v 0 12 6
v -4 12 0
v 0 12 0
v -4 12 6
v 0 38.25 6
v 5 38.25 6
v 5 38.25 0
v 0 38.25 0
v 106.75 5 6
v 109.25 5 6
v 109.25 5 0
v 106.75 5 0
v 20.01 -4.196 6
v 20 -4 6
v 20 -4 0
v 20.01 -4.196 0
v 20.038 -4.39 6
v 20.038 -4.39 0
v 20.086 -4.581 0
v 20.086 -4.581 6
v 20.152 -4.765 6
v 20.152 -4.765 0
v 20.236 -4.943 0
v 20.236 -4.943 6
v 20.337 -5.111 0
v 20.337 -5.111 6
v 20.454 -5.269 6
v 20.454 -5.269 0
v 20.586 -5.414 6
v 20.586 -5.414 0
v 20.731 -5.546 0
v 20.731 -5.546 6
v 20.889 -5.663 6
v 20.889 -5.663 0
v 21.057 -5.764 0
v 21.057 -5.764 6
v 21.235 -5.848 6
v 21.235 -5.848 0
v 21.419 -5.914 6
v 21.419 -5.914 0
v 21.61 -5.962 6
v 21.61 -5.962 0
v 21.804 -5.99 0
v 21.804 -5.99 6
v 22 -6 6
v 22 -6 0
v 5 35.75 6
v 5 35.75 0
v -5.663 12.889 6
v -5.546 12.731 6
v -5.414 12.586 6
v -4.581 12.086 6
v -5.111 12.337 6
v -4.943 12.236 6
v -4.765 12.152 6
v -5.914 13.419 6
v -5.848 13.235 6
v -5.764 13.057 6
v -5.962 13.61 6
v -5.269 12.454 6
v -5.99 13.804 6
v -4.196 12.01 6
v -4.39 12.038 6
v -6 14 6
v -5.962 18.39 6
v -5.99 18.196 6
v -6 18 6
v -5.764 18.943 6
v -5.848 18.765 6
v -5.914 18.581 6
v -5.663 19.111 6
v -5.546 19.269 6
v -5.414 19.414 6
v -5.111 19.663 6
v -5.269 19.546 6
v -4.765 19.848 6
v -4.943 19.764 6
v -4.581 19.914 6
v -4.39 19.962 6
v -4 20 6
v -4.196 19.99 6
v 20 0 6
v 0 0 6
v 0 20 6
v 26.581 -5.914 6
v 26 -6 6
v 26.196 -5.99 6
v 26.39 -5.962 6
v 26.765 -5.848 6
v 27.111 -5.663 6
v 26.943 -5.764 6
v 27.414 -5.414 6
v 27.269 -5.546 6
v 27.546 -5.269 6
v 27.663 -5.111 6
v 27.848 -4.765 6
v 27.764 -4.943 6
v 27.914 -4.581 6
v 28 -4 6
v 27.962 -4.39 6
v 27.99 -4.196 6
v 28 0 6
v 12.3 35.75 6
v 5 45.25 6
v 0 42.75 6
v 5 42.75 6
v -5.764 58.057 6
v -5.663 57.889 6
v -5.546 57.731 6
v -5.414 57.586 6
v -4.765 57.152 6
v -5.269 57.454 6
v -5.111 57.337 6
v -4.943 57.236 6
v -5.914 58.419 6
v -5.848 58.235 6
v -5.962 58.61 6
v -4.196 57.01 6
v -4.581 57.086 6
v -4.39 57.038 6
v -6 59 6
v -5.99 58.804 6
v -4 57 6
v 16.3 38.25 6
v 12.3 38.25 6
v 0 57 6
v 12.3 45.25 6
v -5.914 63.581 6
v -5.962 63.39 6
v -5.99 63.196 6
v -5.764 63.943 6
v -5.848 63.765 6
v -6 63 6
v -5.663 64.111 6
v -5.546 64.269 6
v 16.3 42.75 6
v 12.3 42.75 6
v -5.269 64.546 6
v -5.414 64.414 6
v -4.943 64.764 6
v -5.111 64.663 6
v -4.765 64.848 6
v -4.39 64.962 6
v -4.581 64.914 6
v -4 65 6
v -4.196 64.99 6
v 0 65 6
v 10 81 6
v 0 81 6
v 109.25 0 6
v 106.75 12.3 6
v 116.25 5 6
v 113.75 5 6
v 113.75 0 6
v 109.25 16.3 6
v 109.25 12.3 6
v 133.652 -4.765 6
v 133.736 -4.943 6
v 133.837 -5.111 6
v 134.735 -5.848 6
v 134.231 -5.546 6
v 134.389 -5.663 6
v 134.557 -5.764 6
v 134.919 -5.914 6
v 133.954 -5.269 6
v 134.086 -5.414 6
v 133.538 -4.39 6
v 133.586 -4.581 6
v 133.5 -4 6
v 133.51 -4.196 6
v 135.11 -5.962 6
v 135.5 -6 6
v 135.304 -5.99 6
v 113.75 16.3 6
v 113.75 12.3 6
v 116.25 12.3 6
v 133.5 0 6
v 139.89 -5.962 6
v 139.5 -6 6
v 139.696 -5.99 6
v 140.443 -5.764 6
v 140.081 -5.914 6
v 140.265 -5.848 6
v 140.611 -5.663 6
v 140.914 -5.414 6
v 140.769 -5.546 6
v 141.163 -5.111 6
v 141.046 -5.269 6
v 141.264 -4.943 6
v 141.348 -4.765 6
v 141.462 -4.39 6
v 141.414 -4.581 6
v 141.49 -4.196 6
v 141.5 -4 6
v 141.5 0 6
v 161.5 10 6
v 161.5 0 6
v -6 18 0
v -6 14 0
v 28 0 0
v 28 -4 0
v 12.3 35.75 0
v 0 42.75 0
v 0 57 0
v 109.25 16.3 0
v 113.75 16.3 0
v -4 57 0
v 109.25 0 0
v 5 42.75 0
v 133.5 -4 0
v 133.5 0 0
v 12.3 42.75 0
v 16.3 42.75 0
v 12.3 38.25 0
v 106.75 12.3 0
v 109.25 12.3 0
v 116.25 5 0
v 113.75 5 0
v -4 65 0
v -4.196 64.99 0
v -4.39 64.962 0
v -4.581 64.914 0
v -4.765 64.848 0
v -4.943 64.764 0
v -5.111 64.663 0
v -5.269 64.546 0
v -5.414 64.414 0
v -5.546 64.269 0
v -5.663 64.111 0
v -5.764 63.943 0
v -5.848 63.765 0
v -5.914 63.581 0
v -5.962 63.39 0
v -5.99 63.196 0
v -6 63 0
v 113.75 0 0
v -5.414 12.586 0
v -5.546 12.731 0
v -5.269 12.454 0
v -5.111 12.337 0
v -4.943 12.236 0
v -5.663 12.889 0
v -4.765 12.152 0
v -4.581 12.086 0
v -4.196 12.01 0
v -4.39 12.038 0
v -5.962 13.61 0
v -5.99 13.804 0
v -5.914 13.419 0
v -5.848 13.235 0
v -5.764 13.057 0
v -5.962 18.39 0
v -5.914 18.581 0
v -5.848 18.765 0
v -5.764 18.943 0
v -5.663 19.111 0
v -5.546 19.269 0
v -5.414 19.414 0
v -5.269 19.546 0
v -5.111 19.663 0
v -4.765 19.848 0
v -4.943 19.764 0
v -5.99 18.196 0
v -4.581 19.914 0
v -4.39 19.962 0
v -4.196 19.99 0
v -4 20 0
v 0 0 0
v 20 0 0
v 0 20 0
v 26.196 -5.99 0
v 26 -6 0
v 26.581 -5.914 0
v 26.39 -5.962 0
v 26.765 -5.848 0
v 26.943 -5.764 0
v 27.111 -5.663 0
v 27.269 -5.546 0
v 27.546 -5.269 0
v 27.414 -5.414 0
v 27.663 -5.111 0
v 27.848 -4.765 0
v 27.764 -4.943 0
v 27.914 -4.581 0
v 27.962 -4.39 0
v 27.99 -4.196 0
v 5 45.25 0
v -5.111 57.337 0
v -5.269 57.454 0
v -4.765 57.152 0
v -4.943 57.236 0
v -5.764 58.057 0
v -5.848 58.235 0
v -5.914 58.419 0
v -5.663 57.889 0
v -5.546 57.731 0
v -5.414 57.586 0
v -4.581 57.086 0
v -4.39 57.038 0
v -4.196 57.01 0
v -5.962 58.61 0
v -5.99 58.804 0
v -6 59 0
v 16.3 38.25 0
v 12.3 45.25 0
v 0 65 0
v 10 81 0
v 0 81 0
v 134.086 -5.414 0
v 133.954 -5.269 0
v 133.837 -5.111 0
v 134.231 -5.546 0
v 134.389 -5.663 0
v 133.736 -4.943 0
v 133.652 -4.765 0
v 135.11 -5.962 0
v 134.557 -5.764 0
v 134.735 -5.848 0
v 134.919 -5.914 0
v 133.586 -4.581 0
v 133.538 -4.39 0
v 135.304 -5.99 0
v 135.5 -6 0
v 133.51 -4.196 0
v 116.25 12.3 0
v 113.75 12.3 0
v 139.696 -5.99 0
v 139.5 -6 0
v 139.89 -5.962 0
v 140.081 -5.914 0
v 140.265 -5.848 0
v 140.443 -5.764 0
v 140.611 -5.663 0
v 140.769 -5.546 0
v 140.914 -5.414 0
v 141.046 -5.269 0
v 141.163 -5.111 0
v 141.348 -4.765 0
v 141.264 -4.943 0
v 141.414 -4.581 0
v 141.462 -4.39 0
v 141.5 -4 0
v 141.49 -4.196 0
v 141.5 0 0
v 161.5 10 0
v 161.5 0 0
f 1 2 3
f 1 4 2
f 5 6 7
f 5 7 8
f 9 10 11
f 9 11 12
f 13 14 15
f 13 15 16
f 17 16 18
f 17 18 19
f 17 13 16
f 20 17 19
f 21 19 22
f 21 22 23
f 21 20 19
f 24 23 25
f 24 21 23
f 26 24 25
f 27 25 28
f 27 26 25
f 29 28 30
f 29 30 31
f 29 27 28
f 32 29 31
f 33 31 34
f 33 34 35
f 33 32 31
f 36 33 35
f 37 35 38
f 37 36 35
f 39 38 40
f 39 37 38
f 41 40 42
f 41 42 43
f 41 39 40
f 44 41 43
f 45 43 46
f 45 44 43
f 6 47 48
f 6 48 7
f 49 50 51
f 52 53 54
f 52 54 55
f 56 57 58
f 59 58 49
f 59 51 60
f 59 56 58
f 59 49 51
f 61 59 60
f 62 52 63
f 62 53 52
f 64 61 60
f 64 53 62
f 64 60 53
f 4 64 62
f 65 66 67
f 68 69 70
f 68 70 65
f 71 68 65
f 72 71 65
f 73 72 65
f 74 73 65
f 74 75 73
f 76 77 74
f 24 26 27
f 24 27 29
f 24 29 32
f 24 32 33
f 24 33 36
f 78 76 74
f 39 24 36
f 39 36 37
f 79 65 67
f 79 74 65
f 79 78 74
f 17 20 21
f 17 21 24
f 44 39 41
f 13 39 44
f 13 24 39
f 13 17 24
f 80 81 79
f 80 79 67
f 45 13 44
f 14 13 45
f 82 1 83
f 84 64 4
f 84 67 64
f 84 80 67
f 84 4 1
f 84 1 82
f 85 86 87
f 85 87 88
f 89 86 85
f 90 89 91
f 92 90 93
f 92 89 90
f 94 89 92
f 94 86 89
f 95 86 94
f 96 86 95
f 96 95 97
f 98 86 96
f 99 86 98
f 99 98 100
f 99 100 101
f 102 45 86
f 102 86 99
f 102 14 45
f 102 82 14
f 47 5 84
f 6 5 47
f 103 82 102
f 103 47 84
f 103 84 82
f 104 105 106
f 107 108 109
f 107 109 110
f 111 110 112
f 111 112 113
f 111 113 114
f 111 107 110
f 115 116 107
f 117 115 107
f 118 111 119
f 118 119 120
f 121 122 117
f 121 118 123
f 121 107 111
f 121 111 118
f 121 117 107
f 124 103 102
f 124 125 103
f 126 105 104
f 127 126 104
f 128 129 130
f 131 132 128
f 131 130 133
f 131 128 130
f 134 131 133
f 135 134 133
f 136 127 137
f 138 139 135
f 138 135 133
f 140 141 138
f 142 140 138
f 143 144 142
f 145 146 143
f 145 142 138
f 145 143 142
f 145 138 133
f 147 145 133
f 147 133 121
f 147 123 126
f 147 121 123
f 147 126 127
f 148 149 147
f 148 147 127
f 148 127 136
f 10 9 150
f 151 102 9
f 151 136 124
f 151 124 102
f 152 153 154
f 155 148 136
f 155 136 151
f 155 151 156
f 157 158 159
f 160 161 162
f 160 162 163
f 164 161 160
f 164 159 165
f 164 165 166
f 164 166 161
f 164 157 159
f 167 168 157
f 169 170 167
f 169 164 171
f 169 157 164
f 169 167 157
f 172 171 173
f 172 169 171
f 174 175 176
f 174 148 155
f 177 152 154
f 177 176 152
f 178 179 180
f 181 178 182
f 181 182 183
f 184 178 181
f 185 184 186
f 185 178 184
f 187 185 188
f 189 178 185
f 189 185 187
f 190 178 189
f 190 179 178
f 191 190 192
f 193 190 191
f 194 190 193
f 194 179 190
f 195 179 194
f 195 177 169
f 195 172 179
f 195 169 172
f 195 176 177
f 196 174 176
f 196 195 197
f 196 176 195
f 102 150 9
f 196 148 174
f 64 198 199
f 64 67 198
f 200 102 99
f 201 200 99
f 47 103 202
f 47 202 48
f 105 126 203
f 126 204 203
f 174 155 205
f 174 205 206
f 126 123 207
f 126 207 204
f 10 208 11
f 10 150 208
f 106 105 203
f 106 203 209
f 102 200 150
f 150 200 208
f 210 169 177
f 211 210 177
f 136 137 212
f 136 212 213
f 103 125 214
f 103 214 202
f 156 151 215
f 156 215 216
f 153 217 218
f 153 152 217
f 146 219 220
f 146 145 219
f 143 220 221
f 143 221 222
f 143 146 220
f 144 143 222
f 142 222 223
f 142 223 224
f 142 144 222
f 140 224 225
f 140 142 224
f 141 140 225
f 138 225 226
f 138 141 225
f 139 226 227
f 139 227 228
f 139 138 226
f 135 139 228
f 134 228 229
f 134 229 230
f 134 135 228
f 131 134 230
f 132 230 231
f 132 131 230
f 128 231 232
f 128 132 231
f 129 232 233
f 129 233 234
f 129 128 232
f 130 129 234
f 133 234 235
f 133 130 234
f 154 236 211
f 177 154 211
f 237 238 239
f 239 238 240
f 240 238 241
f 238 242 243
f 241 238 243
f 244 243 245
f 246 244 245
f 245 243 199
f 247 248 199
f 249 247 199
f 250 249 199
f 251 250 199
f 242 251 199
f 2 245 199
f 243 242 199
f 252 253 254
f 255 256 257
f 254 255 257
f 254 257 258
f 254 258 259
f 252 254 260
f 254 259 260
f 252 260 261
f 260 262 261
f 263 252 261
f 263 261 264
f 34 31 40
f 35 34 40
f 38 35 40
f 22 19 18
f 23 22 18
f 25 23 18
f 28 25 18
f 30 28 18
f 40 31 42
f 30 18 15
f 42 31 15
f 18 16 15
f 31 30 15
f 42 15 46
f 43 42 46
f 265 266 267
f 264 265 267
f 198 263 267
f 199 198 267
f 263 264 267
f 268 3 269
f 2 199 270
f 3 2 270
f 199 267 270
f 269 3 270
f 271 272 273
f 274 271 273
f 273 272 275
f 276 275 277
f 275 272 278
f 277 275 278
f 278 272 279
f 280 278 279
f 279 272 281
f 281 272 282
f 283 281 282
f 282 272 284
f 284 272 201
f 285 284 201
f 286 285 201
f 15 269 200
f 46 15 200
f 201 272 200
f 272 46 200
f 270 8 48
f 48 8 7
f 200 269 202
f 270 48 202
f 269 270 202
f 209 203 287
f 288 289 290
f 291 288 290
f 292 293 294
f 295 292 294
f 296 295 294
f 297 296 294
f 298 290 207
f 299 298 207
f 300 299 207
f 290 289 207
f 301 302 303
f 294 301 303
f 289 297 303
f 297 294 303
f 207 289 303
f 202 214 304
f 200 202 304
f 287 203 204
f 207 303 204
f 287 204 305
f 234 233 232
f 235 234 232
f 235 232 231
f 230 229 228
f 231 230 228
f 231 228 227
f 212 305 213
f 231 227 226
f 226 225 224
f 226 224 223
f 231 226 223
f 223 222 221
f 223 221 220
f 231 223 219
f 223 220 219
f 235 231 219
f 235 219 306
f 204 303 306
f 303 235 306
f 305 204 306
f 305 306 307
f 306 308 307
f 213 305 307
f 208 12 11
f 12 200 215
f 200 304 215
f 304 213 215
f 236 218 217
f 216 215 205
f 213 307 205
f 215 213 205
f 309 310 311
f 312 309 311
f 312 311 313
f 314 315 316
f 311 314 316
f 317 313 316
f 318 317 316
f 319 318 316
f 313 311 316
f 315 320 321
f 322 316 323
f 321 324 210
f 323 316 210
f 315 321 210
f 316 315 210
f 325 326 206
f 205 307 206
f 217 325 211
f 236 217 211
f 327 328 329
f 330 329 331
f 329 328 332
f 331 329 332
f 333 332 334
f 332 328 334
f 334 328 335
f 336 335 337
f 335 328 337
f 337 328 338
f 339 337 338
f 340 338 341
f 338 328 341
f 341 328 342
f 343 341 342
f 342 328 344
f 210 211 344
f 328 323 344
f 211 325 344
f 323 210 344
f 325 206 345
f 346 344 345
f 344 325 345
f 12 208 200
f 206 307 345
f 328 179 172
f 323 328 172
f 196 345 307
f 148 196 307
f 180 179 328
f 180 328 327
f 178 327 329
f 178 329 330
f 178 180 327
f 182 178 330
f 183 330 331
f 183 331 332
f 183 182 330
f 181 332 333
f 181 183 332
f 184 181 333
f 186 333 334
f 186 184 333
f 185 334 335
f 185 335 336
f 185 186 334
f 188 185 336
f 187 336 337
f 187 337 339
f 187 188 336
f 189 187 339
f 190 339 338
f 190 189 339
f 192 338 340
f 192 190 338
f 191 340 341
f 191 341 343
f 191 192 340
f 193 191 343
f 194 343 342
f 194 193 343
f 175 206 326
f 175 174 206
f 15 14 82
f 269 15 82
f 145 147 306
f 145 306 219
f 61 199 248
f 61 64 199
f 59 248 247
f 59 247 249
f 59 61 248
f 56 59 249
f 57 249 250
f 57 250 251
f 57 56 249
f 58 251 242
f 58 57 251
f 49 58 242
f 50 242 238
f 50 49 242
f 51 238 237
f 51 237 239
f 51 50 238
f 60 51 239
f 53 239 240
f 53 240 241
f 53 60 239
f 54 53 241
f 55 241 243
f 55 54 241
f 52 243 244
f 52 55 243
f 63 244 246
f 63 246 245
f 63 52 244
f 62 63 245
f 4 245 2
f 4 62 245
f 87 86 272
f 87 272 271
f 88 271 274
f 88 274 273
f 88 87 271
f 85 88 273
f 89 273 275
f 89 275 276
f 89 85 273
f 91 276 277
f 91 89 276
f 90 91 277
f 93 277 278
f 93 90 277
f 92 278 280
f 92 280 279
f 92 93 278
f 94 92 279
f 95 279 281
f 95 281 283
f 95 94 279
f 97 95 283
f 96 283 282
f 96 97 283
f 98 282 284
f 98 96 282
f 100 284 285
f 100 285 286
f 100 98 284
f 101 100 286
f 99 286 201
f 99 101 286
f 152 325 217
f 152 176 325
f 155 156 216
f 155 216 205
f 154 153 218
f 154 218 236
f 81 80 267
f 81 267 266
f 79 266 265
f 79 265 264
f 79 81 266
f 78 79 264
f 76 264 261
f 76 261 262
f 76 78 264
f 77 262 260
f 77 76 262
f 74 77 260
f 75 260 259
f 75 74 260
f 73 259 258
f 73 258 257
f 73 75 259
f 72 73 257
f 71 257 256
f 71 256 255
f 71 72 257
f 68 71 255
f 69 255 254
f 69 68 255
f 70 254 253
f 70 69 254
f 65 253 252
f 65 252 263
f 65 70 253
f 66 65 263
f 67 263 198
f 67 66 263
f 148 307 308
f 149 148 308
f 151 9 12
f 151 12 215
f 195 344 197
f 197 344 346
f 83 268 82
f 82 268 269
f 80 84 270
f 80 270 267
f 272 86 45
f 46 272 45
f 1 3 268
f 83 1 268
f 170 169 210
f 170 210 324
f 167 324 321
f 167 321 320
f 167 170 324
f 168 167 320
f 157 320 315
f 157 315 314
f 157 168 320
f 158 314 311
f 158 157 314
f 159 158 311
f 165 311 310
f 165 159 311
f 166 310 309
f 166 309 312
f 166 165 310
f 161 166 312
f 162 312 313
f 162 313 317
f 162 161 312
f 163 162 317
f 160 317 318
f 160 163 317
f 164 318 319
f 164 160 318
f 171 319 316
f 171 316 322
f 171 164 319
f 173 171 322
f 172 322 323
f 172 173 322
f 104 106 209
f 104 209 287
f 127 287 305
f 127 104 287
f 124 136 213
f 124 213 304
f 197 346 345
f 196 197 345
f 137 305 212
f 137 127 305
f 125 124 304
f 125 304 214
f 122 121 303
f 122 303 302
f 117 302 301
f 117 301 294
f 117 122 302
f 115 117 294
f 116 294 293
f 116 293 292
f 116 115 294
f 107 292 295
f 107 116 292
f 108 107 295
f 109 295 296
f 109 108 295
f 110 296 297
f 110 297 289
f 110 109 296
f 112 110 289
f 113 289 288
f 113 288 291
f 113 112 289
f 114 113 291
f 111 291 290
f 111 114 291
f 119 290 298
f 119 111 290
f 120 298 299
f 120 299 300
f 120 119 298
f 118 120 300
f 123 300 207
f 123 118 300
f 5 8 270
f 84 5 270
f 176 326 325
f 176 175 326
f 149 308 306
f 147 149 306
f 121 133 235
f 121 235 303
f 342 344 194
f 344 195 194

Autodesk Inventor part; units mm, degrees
ref_plane "YZ Plane" through (0, 0, 0) normal (1, 0, 0) x (0, 1, 0)
ref_plane "XZ Plane" through (0, 0, 0) normal (0, 1, 0) x (-1, 0, 0)
ref_plane "XY Plane" through (0, 0, 0) normal (0, 0, 1) x (1, 0, 0)
sketch "Sketch1" plane through (0, 0, 0) normal (0, 0, 1) x (1, 0, 0)
  line L0 (0, 81) -> (0, 0)
  line L1 (0, 0) -> (161.5, 0)
  line L2 (161.5, 0) -> (161.5, 10)
  line L3 (161.5, 10) -> (10, 81)
  line L4 (10, 81) -> (0, 81)
  dimension "d0" = 161.5
  dimension "d1" = 81
  dimension "d2" = 10
  dimension "d3" = 10
extrude "Extrusion1" add sketch "Sketch1" along normal blind 6
sketch "Sketch2" plane through (0, 0, 6) normal (0, 0, 1) x (1, 0, 0)
  line L0 (0, 81) -> (0, 0) projected
  line L1 (0, 0) -> (161.5, 0) projected
  line L2 (161.5, 0) -> (161.5, 10) projected
  line L3 (16.3, 42.75) -> (16.3, 38.25)
  line L4 (0, 38.25) -> (0, 42.75)
  line L5 (5, 45.25) -> (12.3, 45.25)
  line L6 (12.3, 35.75) -> (5, 35.75)
  line L7 (0, 42.75) -> (5, 42.75)
  line L8 (12.3, 42.75) -> (16.3, 42.75)
  line L9 (16.3, 38.25) -> (12.3, 38.25)
  line L10 (5, 38.25) -> (0, 38.25)
  line L11 (5, 35.75) -> (5, 38.25)
  line L12 (5, 42.75) -> (5, 45.25)
  line L13 (12.3, 45.25) -> (12.3, 42.75)
  line L14 (12.3, 38.25) -> (12.3, 35.75)
  line L15 (109.25, 16.3) -> (113.75, 16.3)
  line L16 (113.75, 0) -> (109.25, 0)
  line L17 (116.25, 12.3) -> (116.25, 5)
  line L18 (106.75, 5) -> (106.75, 12.3)
  line L19 (106.75, 12.3) -> (109.25, 12.3)
  line L20 (113.75, 12.3) -> (116.25, 12.3)
  line L21 (116.25, 5) -> (113.75, 5)
  line L22 (109.25, 5) -> (106.75, 5)
  line L23 (109.25, 0) -> (109.25, 5)
  line L24 (109.25, 12.3) -> (109.25, 16.3)
  line L25 (113.75, 16.3) -> (113.75, 12.3)
  line L26 (113.75, 5) -> (113.75, 0)
  point P0 (16.3, 40.5)
  point P1 (0, 40.5)
  point P2 (111.5, 16.3)
  dimension "d6" = 4.5
  dimension "d7" = 2.5
  dimension "d8" = 2.5
  dimension "d9" = 5
  dimension "d10" = 7.3
  dimension "d11" = 4
  dimension "d12" = 4.5
  dimension "d13" = 5
  dimension "d14" = 7.3
  dimension "d15" = 4
  dimension "d16" = 2.5
  dimension "d17" = 2.5
  dimension "d18" = 50
extrude "Extrusion2" cut sketch "Sketch2" against normal blind 6
sketch "Sketch3" plane through (0, 0, 6) normal (0, 0, 1) x (1, 0, 0)
  line L0 (0, 38.25) -> (0, 0) projected
  line L1 (0, 0) -> (109.25, 0) projected
  line L2 (113.75, 0) -> (161.5, 0) projected
  line L3 (10, 81) -> (0, 81) projected
  line L4 (0, 81) -> (0, 42.75) projected
  line L5 (0, 65) -> (-4, 65)
  line L6 (-6, 63) -> (-6, 59)
  line L7 (-4, 57) -> (0, 57)
  line L8 (0, 57) -> (0, 65)
  line L9 (0, 20) -> (-4, 20)
  line L10 (-6, 18) -> (-6, 14)
  line L11 (-4, 12) -> (0, 12)
  line L12 (0, 12) -> (0, 20)
  line L13 (20, 0) -> (28, 0)
  line L14 (28, 0) -> (28, -4)
  line L15 (26, -6) -> (22, -6)
  line L16 (20, -4) -> (20, 0)
  line L17 (133.5, 0) -> (141.5, 0)
  line L18 (141.5, 0) -> (141.5, -4)
  line L19 (139.5, -6) -> (135.5, -6)
  line L20 (133.5, -4) -> (133.5, 0)
  arc A0 (-4, 65) -> (-6, 63) centre (-4, 63) ccw
  arc A1 (-6, 59) -> (-4, 57) centre (-4, 59) ccw
  arc A2 (-4, 20) -> (-6, 18) centre (-4, 18) ccw
  arc A3 (-6, 14) -> (-4, 12) centre (-4, 14) ccw
  arc A4 (20, -4) -> (22, -6) centre (22, -4) ccw
  arc A5 (26, -6) -> (28, -4) centre (26, -4) ccw
  arc A6 (133.5, -4) -> (135.5, -6) centre (135.5, -4) ccw
  arc A7 (139.5, -6) -> (141.5, -4) centre (139.5, -4) ccw
  dimension "d21" = 2
  dimension "d22" = 8
  dimension "d23" = 8
  dimension "d24" = 8
  dimension "d25" = 8
  dimension "d26" = 6
  dimension "d27" = 6
  dimension "d28" = 12
  dimension "d29" = 16
  dimension "d30" = 20
  dimension "d31" = 20
extrude "Extrusion3" add sketch "Sketch3" against normal blind 6
properties part number "wiring_brace"
